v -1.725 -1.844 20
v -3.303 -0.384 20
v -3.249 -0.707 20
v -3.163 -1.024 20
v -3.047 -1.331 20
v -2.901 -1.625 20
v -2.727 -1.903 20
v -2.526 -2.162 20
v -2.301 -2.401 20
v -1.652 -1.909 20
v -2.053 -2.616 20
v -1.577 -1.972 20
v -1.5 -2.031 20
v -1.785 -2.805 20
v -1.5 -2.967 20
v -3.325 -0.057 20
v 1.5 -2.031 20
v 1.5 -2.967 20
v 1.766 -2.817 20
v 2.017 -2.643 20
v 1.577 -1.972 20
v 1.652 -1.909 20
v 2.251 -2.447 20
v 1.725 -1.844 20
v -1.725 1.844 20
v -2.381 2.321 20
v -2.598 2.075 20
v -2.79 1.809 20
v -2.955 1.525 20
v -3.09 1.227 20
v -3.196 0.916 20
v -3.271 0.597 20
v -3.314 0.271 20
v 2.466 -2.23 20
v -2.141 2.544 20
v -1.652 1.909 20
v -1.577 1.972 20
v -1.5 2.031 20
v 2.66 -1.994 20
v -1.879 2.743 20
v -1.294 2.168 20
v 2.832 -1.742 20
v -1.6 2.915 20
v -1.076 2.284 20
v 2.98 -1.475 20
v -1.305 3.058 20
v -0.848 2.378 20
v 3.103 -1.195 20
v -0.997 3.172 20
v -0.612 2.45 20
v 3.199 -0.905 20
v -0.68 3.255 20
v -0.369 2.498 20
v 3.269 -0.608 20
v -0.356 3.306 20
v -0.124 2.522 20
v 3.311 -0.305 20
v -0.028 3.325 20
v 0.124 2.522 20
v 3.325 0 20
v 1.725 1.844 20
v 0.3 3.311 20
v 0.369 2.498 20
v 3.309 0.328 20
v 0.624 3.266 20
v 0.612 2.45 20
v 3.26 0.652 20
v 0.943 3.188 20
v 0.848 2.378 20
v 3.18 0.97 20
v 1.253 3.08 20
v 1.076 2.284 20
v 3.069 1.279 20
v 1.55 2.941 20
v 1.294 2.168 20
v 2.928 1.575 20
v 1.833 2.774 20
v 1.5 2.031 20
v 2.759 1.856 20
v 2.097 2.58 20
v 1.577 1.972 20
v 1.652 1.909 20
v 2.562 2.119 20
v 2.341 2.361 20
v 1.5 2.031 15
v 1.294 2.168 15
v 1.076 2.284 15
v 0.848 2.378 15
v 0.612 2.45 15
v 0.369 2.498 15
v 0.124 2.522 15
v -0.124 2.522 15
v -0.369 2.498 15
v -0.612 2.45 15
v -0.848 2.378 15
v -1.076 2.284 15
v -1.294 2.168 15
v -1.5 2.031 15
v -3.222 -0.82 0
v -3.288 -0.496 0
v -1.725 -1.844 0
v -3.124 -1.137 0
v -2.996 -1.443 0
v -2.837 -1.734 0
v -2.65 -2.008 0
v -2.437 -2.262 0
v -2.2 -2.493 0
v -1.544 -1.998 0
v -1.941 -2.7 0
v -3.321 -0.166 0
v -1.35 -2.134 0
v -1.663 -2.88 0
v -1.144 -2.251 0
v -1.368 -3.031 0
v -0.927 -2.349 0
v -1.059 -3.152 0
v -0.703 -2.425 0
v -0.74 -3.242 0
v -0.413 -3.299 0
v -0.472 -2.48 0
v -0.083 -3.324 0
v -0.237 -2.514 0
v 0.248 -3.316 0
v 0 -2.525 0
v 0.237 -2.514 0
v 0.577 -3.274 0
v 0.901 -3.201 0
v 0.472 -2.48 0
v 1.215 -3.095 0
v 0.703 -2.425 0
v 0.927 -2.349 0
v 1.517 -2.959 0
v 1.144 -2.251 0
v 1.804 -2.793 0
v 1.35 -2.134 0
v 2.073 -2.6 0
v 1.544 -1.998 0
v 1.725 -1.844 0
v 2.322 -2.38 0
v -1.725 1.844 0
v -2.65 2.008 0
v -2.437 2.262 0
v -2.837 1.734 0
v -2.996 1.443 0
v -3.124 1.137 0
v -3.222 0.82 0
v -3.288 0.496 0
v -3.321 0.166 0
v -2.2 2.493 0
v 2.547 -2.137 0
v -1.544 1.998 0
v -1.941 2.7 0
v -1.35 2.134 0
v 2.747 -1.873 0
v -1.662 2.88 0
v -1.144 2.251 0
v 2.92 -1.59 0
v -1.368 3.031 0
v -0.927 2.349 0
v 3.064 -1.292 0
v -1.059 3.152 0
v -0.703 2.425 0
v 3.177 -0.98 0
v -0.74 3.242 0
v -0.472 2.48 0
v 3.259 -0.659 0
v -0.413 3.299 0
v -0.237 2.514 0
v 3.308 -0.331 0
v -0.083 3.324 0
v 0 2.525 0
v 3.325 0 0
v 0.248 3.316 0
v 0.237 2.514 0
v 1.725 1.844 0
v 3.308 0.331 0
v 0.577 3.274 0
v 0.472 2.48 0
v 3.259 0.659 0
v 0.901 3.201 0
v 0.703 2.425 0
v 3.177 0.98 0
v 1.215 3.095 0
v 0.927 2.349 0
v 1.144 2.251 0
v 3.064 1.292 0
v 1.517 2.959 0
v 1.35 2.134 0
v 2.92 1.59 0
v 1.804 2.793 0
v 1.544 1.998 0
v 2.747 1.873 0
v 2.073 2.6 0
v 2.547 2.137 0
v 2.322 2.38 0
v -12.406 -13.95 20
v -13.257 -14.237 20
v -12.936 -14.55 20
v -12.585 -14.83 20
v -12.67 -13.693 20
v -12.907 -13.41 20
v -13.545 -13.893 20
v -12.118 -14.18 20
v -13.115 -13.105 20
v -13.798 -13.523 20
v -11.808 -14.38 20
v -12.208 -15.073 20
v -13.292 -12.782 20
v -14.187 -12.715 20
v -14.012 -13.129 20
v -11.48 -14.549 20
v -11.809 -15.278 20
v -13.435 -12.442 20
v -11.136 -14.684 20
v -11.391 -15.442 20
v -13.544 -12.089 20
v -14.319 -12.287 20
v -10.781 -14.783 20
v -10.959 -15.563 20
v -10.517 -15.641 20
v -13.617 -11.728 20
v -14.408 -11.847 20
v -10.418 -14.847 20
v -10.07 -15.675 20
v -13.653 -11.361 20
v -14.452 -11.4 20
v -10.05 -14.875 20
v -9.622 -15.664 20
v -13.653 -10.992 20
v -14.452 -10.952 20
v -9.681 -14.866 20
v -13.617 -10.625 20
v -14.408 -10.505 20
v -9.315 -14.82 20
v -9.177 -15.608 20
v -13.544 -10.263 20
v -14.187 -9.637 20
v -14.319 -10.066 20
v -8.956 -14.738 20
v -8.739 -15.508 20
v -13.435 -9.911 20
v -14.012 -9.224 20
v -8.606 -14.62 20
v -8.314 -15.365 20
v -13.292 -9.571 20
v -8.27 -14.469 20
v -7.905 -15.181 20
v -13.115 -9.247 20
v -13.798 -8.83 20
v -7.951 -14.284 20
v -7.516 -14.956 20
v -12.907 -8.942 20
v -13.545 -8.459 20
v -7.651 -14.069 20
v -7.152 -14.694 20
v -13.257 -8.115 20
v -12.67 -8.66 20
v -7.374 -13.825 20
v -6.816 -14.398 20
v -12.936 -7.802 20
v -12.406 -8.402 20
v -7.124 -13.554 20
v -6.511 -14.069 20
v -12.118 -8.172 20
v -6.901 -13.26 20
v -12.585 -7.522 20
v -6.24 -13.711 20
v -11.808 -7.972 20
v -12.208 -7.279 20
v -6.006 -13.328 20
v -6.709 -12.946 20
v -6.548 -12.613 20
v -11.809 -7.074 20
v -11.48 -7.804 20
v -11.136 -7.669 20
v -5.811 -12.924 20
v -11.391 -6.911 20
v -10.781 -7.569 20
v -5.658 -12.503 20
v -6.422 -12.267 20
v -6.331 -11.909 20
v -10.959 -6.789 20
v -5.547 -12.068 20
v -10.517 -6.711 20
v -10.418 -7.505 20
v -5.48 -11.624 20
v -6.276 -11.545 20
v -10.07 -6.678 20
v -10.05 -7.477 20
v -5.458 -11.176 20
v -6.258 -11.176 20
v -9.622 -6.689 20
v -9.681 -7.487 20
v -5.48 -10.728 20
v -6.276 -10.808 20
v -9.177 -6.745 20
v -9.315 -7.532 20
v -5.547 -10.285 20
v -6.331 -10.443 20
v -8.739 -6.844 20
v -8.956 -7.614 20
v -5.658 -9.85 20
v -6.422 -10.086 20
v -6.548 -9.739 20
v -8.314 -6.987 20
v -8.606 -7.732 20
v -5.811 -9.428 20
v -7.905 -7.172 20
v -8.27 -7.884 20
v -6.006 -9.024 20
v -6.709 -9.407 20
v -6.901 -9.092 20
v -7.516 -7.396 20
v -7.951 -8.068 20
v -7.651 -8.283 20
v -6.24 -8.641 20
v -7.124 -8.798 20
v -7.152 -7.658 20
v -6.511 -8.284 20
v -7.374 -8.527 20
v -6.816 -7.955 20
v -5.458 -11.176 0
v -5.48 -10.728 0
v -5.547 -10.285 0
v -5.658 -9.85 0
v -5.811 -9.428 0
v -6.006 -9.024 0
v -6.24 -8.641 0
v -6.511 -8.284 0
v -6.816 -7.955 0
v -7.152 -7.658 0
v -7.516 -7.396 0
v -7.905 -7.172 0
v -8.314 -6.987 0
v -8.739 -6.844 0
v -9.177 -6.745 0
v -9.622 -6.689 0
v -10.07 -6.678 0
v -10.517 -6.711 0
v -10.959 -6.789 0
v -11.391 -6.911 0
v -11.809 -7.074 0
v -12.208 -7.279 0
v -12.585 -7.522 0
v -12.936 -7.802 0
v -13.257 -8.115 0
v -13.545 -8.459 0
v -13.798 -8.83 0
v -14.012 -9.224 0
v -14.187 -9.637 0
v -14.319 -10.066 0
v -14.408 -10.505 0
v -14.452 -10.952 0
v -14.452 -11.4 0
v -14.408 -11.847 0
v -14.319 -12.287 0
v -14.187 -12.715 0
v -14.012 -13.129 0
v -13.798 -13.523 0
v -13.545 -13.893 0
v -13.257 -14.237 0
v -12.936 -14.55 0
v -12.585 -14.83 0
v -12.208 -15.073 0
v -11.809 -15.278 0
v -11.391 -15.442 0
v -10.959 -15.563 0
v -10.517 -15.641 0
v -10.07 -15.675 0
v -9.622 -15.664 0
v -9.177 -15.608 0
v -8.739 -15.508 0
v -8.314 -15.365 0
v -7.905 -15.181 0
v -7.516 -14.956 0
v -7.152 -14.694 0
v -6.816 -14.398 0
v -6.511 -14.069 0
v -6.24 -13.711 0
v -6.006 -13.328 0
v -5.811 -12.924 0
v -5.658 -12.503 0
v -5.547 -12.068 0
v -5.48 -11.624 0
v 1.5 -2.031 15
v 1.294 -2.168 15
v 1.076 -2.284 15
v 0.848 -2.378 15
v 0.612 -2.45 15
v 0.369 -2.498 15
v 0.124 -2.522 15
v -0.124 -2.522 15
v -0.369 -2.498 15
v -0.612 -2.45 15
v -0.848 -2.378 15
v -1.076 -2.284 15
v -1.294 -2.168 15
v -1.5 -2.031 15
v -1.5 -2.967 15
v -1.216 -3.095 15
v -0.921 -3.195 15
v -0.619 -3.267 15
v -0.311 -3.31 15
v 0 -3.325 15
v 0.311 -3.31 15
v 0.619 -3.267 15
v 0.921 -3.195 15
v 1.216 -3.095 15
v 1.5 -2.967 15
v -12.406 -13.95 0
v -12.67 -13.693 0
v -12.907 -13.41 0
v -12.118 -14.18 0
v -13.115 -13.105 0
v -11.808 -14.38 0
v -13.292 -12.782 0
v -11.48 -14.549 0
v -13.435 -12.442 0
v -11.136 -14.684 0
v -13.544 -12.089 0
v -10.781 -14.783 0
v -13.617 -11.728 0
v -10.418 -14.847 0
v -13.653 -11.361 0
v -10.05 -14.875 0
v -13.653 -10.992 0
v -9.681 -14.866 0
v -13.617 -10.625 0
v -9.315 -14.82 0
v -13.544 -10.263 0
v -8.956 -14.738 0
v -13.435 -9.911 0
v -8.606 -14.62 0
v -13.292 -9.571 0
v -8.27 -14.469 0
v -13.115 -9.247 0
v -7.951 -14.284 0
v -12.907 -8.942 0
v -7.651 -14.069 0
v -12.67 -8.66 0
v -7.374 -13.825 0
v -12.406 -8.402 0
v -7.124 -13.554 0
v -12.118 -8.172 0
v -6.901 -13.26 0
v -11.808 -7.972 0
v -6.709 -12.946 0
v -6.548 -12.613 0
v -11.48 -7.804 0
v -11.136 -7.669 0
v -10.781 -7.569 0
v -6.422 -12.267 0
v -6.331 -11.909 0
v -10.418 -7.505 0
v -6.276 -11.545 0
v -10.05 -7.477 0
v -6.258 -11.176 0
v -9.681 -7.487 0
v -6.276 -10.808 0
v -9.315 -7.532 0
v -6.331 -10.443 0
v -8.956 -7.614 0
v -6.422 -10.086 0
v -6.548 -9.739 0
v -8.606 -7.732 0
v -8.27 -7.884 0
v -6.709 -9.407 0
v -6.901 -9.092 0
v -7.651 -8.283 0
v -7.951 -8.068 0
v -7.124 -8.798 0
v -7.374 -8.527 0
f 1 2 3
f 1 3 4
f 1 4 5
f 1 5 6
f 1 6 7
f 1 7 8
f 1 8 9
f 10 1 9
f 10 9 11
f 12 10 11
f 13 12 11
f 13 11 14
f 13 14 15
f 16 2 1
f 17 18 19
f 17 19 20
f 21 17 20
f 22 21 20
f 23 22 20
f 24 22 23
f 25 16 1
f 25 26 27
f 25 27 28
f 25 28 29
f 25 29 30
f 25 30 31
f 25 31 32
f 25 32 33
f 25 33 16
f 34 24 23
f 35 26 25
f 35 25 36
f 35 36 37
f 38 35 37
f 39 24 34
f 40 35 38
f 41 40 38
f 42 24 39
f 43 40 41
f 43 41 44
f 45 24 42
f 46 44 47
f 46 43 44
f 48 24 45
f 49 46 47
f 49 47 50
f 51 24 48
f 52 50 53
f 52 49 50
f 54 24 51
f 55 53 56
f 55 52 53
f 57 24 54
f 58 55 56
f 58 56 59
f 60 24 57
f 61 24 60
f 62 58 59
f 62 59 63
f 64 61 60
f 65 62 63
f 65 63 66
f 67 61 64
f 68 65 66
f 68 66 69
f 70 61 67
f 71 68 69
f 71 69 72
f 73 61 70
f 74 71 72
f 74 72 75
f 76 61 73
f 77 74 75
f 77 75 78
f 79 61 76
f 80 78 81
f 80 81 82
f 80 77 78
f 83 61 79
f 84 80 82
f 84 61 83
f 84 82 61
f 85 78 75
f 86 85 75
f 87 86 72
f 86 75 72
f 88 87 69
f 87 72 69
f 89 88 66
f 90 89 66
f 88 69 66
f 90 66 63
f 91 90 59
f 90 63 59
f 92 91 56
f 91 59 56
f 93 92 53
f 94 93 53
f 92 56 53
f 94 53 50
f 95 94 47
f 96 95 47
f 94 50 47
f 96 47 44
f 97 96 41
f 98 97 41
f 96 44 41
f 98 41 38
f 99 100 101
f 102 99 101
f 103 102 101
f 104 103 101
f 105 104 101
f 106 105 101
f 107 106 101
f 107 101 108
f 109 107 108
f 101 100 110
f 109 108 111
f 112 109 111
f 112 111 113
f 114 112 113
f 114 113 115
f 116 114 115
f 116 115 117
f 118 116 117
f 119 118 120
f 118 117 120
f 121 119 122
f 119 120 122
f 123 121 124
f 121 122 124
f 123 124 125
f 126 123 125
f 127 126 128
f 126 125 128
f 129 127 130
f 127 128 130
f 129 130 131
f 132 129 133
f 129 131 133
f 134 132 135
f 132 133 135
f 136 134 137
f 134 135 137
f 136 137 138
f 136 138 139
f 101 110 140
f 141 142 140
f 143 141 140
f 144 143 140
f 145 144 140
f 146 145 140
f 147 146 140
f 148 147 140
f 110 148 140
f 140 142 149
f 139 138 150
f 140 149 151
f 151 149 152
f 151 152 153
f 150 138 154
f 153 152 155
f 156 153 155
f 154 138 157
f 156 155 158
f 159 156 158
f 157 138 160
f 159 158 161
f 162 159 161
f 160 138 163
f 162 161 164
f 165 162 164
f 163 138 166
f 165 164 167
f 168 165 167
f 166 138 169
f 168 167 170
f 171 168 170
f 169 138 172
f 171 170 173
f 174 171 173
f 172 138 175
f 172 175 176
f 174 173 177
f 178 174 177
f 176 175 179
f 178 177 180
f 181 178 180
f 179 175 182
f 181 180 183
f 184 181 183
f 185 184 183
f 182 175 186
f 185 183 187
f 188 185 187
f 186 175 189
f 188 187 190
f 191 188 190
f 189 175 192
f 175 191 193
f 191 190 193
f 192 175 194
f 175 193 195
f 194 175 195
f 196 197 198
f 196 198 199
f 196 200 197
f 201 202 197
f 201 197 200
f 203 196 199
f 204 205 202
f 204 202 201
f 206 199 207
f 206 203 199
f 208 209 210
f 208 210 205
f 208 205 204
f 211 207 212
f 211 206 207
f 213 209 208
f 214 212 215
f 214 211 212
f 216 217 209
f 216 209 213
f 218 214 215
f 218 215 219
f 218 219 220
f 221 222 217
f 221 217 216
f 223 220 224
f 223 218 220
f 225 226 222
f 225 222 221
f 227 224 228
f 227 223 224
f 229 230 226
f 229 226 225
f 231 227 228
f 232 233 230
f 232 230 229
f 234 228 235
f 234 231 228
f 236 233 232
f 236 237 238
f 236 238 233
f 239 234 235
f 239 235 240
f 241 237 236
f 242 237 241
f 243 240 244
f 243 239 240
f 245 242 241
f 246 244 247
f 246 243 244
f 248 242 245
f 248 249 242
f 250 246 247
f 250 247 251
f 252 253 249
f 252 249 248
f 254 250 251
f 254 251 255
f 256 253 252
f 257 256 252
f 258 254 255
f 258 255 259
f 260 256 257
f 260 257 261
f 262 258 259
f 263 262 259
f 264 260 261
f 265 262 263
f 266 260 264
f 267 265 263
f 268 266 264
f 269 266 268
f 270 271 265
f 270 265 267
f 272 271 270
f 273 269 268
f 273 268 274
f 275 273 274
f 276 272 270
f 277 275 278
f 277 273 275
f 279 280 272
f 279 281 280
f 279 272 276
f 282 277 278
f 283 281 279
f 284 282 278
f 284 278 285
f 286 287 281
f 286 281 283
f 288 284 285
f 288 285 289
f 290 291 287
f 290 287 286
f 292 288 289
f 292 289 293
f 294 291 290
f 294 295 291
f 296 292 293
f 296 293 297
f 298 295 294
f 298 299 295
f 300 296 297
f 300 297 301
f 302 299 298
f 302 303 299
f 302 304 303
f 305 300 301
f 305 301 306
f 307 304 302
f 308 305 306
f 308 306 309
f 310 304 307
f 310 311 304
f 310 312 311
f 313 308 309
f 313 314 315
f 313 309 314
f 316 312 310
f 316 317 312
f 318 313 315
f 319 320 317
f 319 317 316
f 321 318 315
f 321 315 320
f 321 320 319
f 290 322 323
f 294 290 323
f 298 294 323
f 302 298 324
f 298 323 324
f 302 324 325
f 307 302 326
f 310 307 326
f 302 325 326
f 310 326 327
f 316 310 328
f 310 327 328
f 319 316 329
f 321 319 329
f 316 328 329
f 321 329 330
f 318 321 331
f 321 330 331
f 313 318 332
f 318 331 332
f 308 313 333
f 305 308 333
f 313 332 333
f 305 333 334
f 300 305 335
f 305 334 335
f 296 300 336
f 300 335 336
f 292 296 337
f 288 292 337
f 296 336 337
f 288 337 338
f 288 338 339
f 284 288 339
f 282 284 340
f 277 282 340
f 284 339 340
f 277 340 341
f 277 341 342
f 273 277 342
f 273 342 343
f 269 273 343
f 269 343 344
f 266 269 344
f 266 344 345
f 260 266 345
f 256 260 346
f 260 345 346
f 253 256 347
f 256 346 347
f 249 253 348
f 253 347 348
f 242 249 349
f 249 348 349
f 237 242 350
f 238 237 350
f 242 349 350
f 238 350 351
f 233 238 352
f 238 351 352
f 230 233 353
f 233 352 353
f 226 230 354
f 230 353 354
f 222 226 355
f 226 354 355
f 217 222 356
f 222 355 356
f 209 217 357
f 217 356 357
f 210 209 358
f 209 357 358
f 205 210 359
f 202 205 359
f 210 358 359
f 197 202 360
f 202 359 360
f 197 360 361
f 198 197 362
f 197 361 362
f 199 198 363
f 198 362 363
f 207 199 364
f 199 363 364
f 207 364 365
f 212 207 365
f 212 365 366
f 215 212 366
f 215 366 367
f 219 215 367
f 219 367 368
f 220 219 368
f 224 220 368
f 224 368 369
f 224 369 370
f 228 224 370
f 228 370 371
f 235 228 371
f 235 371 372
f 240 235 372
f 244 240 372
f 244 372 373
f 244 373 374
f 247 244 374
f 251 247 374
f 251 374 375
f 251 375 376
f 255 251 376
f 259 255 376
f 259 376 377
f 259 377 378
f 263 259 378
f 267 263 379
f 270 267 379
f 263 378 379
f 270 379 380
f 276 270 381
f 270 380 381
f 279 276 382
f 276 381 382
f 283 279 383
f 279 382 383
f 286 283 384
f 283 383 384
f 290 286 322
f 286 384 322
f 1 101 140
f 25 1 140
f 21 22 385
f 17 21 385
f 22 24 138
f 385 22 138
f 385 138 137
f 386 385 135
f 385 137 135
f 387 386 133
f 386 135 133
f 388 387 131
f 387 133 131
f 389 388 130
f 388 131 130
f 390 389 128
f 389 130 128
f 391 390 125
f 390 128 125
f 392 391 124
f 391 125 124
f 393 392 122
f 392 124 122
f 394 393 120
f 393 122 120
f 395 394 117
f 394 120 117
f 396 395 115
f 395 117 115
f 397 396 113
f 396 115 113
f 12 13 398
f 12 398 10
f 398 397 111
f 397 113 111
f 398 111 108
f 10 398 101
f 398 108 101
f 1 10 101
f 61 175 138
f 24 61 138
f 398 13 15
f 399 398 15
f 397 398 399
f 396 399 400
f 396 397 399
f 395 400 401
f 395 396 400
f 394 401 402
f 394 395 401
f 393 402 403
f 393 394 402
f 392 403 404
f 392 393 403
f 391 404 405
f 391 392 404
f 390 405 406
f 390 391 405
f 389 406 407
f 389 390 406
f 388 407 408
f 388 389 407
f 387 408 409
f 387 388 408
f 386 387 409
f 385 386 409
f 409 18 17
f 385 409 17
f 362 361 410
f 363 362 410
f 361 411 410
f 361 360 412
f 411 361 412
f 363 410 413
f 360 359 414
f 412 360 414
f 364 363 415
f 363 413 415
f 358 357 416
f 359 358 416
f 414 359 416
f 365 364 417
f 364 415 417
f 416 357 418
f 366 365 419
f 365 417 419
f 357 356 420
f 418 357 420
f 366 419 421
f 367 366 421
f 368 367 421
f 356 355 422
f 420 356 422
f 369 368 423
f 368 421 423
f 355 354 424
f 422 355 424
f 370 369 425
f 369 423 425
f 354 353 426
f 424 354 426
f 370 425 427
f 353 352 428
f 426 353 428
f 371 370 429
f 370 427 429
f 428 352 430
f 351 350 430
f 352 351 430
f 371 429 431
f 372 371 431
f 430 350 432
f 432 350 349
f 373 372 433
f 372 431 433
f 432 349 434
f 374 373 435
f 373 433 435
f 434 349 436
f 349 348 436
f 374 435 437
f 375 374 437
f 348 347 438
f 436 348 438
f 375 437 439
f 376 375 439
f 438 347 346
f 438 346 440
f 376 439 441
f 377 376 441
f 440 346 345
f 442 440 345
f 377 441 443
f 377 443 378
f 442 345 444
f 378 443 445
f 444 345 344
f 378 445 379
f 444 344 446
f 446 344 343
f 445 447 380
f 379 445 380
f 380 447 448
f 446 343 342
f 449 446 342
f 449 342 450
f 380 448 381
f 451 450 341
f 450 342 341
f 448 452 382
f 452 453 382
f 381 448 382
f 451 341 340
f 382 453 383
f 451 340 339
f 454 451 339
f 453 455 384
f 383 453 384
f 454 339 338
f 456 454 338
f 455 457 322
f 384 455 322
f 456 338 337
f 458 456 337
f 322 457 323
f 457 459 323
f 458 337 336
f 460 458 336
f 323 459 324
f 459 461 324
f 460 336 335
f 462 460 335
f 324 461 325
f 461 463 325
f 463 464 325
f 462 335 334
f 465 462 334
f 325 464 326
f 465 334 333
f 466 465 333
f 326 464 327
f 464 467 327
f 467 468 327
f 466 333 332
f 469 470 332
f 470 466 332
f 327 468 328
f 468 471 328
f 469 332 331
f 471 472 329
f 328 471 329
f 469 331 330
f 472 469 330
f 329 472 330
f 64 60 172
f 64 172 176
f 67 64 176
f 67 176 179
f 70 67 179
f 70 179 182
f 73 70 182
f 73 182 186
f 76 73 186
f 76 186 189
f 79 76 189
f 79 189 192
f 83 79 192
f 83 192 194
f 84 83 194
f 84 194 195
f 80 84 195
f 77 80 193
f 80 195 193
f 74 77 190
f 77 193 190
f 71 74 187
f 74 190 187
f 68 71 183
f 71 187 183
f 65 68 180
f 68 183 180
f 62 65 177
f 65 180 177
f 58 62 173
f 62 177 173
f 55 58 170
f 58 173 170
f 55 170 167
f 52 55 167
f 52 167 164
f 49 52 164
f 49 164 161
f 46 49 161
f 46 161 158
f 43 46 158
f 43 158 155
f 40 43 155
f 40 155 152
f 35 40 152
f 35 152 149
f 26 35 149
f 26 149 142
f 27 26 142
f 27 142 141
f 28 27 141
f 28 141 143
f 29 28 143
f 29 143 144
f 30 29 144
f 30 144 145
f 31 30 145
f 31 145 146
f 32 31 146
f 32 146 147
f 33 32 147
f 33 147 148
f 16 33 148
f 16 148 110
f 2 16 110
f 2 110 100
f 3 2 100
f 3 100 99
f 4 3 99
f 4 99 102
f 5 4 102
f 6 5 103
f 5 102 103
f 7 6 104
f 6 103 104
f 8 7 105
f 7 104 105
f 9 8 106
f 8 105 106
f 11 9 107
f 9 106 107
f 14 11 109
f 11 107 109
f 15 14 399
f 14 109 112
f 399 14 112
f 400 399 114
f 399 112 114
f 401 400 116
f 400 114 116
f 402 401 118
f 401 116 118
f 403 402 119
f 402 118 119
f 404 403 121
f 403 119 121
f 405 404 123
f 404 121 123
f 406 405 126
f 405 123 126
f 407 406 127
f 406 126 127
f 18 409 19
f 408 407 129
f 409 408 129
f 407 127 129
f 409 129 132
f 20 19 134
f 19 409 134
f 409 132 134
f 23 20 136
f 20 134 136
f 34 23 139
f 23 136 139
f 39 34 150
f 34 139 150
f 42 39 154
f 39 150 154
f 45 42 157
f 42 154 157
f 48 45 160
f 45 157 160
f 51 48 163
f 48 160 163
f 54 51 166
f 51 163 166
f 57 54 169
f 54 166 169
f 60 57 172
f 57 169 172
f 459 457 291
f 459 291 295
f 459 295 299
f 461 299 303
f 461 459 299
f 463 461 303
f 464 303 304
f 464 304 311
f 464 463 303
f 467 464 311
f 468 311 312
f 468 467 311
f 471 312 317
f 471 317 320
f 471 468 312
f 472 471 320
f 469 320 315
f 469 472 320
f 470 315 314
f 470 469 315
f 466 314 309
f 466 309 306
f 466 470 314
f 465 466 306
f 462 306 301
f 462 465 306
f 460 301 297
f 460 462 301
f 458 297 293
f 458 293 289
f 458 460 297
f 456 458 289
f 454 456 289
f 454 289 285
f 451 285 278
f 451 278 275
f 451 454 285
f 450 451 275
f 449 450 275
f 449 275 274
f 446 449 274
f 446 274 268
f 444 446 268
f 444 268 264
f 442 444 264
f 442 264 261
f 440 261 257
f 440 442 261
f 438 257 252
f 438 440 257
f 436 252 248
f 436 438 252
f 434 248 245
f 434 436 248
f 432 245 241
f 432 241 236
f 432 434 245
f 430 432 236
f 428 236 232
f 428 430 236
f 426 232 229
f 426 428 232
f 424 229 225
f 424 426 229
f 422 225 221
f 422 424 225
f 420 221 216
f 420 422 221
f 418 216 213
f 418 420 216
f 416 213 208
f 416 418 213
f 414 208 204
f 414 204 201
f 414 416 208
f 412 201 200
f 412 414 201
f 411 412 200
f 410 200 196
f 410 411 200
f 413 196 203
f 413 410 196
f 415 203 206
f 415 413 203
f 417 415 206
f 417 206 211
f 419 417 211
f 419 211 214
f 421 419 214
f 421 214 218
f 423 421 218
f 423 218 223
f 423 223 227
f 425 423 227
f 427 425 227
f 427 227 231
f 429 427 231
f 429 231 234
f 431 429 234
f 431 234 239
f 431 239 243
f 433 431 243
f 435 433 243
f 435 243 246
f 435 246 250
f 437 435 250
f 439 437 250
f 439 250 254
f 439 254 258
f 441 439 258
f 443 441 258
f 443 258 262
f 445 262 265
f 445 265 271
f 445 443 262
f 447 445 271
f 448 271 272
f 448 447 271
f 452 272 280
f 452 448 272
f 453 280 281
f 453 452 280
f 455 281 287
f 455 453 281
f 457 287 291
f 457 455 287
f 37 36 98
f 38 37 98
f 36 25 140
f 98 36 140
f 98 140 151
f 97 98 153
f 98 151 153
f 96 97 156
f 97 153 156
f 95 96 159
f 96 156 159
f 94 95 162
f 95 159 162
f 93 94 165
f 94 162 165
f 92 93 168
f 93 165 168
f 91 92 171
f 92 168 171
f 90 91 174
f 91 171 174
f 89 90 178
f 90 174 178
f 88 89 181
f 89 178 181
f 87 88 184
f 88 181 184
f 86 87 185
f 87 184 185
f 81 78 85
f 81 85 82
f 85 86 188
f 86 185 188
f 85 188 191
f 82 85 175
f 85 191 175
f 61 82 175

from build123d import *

# Parameters (mm, degrees)
F0_R     = 3.325
F1_DEPTH = 20
F0_R_2   = 4.5
F0_R_3   = 3.7
F2_DEPTH = 20
F4_DEPTH = 5


with BuildPart() as f1:
    # F0 (on Top) → F1 (new body)
    with BuildSketch(Plane.XY):
        Circle(F0_R)
        with BuildLine():
            ThreePointArc((1.725, 1.8439088915), (2.316381877, 1.0049875621), (2.525, 0))
            ThreePointArc((2.525, 0), (2.316381877, -1.0049875621), (1.725, -1.8439088915))
            ThreePointArc((1.725, -1.8439088915), (0, -2.525), (-1.725, -1.8439088915))
            ThreePointArc((-1.725, -1.8439088915), (-2.525, 0), (-1.725, 1.8439088915))
            ThreePointArc((-1.725, 1.8439088915), (0, 2.525), (1.725, 1.8439088915))
        make_face(mode=Mode.SUBTRACT)
        with BuildLine():
            Line((-1.725, 0), (-1.725, 1.8439088915))
            ThreePointArc((-1.725, 1.8439088915), (-2.525, 0), (-1.725, -1.8439088915))
            Line((-1.725, -1.8439088915), (-1.725, 0))
        make_face()
        with BuildLine():
            ThreePointArc((1.725, -1.8439088915), (2.316381877, -1.0049875621), (2.525, 0))
            ThreePointArc((2.525, 0), (2.316381877, 1.0049875621), (1.725, 1.8439088915))
            Line((1.725, 1.8439088915), (1.725, 0))
            Line((1.725, 0), (1.725, -1.8439088915))
        make_face()
    extrude(amount=F1_DEPTH)

    # F3 (on face) → F4 (cut)
    with BuildSketch(Plane.XY.offset(20)):
        with BuildLine():
            Line((-1.5, 2.0311634597), (-1.5, -2.0311634597))
            ThreePointArc((-1.5, -2.0311634597), (0, -2.525), (1.5, -2.0311634597))
            Line((1.5, -2.0311634597), (1.5, 2.0311634597))
            ThreePointArc((1.5, 2.0311634597), (0, 2.525), (-1.5, 2.0311634597))
        make_face()
        with BuildLine():
            Line((-1.5, -2.0311634597), (-1.5, -2.9674273369))
            ThreePointArc((-1.5, -2.9674273369), (0, -3.325), (1.5, -2.9674273369))
            Line((1.5, -2.9674273369), (1.5, -2.0311634597))
            ThreePointArc((1.5, -2.0311634597), (0, -2.525), (-1.5, -2.0311634597))
        make_face()
    extrude(amount=-F4_DEPTH, mode=Mode.SUBTRACT)


with BuildPart() as f2:
    # F0 (on Top) → F2 (new body)
    with BuildSketch(Plane.XY):
        with Locations((-9.9579216912, -11.1761782318)):
            Circle(F0_R_2)
        with Locations((-9.9579216912, -11.1761782318)):
            Circle(F0_R_3, mode=Mode.SUBTRACT)
    extrude(amount=F2_DEPTH)


solid = Compound([f1.part, f2.part])
